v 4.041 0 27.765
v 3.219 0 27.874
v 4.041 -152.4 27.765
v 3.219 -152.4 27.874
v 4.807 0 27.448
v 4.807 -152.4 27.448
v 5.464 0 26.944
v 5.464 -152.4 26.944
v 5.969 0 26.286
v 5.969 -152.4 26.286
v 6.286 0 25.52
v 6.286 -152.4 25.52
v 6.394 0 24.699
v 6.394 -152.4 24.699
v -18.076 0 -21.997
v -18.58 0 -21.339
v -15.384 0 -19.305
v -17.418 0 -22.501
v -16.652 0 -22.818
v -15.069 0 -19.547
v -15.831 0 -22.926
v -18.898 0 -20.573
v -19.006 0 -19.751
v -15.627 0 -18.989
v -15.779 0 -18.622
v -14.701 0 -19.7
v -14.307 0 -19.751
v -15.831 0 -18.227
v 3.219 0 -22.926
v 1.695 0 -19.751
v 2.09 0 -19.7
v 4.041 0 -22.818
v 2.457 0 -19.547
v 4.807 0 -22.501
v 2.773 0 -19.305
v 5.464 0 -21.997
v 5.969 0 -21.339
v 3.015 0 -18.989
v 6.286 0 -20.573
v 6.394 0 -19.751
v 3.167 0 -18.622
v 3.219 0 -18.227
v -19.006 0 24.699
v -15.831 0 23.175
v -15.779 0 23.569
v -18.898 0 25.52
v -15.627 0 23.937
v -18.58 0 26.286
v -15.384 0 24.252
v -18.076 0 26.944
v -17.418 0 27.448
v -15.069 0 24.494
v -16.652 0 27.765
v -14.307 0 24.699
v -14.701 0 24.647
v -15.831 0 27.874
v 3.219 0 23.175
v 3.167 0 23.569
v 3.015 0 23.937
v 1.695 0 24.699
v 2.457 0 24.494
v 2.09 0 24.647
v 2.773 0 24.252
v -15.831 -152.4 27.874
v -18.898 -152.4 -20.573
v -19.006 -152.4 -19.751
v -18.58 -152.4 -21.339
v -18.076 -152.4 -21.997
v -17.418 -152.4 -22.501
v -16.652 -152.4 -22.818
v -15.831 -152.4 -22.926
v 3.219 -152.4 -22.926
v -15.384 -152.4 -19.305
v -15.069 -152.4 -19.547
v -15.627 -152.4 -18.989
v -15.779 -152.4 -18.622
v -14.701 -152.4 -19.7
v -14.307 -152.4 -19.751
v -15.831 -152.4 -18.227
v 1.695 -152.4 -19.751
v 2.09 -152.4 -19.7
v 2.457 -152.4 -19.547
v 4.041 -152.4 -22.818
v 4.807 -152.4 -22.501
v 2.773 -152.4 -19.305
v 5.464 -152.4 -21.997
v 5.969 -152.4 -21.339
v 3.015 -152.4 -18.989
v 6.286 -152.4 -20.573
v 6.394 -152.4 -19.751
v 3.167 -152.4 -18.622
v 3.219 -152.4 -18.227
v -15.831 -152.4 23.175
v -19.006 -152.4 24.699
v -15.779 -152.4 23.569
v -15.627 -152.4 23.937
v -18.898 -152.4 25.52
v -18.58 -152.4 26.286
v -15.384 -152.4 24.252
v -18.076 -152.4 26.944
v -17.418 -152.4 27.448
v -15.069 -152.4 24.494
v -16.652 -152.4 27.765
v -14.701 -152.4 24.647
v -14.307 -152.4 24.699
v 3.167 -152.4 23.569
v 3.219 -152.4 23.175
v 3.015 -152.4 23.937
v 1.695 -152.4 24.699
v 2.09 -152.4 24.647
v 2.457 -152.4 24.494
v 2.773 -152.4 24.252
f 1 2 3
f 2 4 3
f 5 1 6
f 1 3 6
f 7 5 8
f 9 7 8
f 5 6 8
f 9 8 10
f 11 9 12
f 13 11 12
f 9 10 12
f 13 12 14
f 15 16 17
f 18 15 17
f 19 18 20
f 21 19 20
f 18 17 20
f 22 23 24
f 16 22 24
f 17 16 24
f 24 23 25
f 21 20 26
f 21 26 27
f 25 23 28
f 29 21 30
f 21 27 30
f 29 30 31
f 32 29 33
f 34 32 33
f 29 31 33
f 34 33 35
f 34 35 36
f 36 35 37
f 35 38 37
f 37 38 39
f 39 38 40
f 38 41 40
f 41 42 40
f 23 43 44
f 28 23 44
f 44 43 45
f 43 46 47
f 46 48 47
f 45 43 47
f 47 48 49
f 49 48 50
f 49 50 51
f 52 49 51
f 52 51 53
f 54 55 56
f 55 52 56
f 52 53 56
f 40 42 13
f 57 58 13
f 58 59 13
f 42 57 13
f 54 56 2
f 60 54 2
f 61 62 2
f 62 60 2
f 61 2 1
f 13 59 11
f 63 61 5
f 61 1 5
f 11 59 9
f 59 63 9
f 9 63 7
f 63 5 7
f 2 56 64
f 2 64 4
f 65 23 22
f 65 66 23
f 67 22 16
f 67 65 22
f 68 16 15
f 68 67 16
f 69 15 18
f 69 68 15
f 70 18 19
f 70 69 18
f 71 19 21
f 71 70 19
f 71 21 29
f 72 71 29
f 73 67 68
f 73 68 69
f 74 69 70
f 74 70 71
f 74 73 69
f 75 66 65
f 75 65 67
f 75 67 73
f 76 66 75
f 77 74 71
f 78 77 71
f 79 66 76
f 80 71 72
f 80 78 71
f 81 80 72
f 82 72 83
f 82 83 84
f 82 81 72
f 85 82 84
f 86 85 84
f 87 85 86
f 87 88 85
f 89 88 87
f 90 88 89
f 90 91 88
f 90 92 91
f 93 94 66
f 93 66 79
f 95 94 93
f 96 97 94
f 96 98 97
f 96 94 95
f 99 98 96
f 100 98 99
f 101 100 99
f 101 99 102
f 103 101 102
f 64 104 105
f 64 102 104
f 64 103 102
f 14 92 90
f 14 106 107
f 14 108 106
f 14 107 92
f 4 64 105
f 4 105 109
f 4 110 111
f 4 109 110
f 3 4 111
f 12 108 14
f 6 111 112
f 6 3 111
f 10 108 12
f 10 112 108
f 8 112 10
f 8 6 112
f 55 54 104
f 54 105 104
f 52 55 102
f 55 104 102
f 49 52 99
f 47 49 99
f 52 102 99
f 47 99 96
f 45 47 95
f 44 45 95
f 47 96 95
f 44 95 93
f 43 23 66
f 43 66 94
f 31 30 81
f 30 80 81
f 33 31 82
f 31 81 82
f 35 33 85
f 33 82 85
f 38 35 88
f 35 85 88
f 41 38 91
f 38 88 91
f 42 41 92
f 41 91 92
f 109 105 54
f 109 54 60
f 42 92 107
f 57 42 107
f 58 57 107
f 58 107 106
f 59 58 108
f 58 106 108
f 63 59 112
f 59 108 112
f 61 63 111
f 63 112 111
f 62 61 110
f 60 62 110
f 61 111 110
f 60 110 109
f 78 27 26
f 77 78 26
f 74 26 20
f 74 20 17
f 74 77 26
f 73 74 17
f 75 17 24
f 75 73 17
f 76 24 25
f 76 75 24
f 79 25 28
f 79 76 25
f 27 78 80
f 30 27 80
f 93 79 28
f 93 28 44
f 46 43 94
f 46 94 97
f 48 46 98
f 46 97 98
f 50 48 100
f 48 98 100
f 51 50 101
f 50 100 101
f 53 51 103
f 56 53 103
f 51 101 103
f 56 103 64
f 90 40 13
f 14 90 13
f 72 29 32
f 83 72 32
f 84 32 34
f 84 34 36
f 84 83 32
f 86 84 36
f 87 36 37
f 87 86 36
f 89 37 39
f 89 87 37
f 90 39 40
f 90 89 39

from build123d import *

# Parameters (mm, degrees)
F0_W     = 25.4
F0_H     = 50.8
F0_W_2   = 19.05
F0_H_2   = 44.45
F1_DEPTH = 152.4
F2_R     = 3.175
F3_R     = 1.524


with BuildPart() as f1:
    # F0 (on Front) → F1 (new body)
    with BuildSketch(Plane.XZ):
        with Locations((-6.305698, 2.473545)):
            Rectangle(F0_W, F0_H)
        with Locations((-6.305698, 2.473545)):
            Rectangle(F0_W_2, F0_H_2, mode=Mode.SUBTRACT)
    extrude(amount=F1_DEPTH)

    # F2
    f2_edges = [f1.edges().sort_by_distance(p)[0] for p in [
        (-19.005698, -76.2, 27.873545),
        (6.394302, -76.2, 27.873545),
        (-19.005698, -76.2, -22.926455),
        (6.394302, -76.2, -22.926455),
    ]]
    fillet(f2_edges, radius=F2_R)

    # F3
    f3_edges = [f1.edges().sort_by_distance(p)[0] for p in [
        (-15.830698, -76.2, 24.698545),
        (3.219302, -76.2, 24.698545),
        (3.219302, -76.2, -19.751455),
        (-15.830698, -76.2, -19.751455),
    ]]
    fillet(f3_edges, radius=F3_R)


solid = f1.part
